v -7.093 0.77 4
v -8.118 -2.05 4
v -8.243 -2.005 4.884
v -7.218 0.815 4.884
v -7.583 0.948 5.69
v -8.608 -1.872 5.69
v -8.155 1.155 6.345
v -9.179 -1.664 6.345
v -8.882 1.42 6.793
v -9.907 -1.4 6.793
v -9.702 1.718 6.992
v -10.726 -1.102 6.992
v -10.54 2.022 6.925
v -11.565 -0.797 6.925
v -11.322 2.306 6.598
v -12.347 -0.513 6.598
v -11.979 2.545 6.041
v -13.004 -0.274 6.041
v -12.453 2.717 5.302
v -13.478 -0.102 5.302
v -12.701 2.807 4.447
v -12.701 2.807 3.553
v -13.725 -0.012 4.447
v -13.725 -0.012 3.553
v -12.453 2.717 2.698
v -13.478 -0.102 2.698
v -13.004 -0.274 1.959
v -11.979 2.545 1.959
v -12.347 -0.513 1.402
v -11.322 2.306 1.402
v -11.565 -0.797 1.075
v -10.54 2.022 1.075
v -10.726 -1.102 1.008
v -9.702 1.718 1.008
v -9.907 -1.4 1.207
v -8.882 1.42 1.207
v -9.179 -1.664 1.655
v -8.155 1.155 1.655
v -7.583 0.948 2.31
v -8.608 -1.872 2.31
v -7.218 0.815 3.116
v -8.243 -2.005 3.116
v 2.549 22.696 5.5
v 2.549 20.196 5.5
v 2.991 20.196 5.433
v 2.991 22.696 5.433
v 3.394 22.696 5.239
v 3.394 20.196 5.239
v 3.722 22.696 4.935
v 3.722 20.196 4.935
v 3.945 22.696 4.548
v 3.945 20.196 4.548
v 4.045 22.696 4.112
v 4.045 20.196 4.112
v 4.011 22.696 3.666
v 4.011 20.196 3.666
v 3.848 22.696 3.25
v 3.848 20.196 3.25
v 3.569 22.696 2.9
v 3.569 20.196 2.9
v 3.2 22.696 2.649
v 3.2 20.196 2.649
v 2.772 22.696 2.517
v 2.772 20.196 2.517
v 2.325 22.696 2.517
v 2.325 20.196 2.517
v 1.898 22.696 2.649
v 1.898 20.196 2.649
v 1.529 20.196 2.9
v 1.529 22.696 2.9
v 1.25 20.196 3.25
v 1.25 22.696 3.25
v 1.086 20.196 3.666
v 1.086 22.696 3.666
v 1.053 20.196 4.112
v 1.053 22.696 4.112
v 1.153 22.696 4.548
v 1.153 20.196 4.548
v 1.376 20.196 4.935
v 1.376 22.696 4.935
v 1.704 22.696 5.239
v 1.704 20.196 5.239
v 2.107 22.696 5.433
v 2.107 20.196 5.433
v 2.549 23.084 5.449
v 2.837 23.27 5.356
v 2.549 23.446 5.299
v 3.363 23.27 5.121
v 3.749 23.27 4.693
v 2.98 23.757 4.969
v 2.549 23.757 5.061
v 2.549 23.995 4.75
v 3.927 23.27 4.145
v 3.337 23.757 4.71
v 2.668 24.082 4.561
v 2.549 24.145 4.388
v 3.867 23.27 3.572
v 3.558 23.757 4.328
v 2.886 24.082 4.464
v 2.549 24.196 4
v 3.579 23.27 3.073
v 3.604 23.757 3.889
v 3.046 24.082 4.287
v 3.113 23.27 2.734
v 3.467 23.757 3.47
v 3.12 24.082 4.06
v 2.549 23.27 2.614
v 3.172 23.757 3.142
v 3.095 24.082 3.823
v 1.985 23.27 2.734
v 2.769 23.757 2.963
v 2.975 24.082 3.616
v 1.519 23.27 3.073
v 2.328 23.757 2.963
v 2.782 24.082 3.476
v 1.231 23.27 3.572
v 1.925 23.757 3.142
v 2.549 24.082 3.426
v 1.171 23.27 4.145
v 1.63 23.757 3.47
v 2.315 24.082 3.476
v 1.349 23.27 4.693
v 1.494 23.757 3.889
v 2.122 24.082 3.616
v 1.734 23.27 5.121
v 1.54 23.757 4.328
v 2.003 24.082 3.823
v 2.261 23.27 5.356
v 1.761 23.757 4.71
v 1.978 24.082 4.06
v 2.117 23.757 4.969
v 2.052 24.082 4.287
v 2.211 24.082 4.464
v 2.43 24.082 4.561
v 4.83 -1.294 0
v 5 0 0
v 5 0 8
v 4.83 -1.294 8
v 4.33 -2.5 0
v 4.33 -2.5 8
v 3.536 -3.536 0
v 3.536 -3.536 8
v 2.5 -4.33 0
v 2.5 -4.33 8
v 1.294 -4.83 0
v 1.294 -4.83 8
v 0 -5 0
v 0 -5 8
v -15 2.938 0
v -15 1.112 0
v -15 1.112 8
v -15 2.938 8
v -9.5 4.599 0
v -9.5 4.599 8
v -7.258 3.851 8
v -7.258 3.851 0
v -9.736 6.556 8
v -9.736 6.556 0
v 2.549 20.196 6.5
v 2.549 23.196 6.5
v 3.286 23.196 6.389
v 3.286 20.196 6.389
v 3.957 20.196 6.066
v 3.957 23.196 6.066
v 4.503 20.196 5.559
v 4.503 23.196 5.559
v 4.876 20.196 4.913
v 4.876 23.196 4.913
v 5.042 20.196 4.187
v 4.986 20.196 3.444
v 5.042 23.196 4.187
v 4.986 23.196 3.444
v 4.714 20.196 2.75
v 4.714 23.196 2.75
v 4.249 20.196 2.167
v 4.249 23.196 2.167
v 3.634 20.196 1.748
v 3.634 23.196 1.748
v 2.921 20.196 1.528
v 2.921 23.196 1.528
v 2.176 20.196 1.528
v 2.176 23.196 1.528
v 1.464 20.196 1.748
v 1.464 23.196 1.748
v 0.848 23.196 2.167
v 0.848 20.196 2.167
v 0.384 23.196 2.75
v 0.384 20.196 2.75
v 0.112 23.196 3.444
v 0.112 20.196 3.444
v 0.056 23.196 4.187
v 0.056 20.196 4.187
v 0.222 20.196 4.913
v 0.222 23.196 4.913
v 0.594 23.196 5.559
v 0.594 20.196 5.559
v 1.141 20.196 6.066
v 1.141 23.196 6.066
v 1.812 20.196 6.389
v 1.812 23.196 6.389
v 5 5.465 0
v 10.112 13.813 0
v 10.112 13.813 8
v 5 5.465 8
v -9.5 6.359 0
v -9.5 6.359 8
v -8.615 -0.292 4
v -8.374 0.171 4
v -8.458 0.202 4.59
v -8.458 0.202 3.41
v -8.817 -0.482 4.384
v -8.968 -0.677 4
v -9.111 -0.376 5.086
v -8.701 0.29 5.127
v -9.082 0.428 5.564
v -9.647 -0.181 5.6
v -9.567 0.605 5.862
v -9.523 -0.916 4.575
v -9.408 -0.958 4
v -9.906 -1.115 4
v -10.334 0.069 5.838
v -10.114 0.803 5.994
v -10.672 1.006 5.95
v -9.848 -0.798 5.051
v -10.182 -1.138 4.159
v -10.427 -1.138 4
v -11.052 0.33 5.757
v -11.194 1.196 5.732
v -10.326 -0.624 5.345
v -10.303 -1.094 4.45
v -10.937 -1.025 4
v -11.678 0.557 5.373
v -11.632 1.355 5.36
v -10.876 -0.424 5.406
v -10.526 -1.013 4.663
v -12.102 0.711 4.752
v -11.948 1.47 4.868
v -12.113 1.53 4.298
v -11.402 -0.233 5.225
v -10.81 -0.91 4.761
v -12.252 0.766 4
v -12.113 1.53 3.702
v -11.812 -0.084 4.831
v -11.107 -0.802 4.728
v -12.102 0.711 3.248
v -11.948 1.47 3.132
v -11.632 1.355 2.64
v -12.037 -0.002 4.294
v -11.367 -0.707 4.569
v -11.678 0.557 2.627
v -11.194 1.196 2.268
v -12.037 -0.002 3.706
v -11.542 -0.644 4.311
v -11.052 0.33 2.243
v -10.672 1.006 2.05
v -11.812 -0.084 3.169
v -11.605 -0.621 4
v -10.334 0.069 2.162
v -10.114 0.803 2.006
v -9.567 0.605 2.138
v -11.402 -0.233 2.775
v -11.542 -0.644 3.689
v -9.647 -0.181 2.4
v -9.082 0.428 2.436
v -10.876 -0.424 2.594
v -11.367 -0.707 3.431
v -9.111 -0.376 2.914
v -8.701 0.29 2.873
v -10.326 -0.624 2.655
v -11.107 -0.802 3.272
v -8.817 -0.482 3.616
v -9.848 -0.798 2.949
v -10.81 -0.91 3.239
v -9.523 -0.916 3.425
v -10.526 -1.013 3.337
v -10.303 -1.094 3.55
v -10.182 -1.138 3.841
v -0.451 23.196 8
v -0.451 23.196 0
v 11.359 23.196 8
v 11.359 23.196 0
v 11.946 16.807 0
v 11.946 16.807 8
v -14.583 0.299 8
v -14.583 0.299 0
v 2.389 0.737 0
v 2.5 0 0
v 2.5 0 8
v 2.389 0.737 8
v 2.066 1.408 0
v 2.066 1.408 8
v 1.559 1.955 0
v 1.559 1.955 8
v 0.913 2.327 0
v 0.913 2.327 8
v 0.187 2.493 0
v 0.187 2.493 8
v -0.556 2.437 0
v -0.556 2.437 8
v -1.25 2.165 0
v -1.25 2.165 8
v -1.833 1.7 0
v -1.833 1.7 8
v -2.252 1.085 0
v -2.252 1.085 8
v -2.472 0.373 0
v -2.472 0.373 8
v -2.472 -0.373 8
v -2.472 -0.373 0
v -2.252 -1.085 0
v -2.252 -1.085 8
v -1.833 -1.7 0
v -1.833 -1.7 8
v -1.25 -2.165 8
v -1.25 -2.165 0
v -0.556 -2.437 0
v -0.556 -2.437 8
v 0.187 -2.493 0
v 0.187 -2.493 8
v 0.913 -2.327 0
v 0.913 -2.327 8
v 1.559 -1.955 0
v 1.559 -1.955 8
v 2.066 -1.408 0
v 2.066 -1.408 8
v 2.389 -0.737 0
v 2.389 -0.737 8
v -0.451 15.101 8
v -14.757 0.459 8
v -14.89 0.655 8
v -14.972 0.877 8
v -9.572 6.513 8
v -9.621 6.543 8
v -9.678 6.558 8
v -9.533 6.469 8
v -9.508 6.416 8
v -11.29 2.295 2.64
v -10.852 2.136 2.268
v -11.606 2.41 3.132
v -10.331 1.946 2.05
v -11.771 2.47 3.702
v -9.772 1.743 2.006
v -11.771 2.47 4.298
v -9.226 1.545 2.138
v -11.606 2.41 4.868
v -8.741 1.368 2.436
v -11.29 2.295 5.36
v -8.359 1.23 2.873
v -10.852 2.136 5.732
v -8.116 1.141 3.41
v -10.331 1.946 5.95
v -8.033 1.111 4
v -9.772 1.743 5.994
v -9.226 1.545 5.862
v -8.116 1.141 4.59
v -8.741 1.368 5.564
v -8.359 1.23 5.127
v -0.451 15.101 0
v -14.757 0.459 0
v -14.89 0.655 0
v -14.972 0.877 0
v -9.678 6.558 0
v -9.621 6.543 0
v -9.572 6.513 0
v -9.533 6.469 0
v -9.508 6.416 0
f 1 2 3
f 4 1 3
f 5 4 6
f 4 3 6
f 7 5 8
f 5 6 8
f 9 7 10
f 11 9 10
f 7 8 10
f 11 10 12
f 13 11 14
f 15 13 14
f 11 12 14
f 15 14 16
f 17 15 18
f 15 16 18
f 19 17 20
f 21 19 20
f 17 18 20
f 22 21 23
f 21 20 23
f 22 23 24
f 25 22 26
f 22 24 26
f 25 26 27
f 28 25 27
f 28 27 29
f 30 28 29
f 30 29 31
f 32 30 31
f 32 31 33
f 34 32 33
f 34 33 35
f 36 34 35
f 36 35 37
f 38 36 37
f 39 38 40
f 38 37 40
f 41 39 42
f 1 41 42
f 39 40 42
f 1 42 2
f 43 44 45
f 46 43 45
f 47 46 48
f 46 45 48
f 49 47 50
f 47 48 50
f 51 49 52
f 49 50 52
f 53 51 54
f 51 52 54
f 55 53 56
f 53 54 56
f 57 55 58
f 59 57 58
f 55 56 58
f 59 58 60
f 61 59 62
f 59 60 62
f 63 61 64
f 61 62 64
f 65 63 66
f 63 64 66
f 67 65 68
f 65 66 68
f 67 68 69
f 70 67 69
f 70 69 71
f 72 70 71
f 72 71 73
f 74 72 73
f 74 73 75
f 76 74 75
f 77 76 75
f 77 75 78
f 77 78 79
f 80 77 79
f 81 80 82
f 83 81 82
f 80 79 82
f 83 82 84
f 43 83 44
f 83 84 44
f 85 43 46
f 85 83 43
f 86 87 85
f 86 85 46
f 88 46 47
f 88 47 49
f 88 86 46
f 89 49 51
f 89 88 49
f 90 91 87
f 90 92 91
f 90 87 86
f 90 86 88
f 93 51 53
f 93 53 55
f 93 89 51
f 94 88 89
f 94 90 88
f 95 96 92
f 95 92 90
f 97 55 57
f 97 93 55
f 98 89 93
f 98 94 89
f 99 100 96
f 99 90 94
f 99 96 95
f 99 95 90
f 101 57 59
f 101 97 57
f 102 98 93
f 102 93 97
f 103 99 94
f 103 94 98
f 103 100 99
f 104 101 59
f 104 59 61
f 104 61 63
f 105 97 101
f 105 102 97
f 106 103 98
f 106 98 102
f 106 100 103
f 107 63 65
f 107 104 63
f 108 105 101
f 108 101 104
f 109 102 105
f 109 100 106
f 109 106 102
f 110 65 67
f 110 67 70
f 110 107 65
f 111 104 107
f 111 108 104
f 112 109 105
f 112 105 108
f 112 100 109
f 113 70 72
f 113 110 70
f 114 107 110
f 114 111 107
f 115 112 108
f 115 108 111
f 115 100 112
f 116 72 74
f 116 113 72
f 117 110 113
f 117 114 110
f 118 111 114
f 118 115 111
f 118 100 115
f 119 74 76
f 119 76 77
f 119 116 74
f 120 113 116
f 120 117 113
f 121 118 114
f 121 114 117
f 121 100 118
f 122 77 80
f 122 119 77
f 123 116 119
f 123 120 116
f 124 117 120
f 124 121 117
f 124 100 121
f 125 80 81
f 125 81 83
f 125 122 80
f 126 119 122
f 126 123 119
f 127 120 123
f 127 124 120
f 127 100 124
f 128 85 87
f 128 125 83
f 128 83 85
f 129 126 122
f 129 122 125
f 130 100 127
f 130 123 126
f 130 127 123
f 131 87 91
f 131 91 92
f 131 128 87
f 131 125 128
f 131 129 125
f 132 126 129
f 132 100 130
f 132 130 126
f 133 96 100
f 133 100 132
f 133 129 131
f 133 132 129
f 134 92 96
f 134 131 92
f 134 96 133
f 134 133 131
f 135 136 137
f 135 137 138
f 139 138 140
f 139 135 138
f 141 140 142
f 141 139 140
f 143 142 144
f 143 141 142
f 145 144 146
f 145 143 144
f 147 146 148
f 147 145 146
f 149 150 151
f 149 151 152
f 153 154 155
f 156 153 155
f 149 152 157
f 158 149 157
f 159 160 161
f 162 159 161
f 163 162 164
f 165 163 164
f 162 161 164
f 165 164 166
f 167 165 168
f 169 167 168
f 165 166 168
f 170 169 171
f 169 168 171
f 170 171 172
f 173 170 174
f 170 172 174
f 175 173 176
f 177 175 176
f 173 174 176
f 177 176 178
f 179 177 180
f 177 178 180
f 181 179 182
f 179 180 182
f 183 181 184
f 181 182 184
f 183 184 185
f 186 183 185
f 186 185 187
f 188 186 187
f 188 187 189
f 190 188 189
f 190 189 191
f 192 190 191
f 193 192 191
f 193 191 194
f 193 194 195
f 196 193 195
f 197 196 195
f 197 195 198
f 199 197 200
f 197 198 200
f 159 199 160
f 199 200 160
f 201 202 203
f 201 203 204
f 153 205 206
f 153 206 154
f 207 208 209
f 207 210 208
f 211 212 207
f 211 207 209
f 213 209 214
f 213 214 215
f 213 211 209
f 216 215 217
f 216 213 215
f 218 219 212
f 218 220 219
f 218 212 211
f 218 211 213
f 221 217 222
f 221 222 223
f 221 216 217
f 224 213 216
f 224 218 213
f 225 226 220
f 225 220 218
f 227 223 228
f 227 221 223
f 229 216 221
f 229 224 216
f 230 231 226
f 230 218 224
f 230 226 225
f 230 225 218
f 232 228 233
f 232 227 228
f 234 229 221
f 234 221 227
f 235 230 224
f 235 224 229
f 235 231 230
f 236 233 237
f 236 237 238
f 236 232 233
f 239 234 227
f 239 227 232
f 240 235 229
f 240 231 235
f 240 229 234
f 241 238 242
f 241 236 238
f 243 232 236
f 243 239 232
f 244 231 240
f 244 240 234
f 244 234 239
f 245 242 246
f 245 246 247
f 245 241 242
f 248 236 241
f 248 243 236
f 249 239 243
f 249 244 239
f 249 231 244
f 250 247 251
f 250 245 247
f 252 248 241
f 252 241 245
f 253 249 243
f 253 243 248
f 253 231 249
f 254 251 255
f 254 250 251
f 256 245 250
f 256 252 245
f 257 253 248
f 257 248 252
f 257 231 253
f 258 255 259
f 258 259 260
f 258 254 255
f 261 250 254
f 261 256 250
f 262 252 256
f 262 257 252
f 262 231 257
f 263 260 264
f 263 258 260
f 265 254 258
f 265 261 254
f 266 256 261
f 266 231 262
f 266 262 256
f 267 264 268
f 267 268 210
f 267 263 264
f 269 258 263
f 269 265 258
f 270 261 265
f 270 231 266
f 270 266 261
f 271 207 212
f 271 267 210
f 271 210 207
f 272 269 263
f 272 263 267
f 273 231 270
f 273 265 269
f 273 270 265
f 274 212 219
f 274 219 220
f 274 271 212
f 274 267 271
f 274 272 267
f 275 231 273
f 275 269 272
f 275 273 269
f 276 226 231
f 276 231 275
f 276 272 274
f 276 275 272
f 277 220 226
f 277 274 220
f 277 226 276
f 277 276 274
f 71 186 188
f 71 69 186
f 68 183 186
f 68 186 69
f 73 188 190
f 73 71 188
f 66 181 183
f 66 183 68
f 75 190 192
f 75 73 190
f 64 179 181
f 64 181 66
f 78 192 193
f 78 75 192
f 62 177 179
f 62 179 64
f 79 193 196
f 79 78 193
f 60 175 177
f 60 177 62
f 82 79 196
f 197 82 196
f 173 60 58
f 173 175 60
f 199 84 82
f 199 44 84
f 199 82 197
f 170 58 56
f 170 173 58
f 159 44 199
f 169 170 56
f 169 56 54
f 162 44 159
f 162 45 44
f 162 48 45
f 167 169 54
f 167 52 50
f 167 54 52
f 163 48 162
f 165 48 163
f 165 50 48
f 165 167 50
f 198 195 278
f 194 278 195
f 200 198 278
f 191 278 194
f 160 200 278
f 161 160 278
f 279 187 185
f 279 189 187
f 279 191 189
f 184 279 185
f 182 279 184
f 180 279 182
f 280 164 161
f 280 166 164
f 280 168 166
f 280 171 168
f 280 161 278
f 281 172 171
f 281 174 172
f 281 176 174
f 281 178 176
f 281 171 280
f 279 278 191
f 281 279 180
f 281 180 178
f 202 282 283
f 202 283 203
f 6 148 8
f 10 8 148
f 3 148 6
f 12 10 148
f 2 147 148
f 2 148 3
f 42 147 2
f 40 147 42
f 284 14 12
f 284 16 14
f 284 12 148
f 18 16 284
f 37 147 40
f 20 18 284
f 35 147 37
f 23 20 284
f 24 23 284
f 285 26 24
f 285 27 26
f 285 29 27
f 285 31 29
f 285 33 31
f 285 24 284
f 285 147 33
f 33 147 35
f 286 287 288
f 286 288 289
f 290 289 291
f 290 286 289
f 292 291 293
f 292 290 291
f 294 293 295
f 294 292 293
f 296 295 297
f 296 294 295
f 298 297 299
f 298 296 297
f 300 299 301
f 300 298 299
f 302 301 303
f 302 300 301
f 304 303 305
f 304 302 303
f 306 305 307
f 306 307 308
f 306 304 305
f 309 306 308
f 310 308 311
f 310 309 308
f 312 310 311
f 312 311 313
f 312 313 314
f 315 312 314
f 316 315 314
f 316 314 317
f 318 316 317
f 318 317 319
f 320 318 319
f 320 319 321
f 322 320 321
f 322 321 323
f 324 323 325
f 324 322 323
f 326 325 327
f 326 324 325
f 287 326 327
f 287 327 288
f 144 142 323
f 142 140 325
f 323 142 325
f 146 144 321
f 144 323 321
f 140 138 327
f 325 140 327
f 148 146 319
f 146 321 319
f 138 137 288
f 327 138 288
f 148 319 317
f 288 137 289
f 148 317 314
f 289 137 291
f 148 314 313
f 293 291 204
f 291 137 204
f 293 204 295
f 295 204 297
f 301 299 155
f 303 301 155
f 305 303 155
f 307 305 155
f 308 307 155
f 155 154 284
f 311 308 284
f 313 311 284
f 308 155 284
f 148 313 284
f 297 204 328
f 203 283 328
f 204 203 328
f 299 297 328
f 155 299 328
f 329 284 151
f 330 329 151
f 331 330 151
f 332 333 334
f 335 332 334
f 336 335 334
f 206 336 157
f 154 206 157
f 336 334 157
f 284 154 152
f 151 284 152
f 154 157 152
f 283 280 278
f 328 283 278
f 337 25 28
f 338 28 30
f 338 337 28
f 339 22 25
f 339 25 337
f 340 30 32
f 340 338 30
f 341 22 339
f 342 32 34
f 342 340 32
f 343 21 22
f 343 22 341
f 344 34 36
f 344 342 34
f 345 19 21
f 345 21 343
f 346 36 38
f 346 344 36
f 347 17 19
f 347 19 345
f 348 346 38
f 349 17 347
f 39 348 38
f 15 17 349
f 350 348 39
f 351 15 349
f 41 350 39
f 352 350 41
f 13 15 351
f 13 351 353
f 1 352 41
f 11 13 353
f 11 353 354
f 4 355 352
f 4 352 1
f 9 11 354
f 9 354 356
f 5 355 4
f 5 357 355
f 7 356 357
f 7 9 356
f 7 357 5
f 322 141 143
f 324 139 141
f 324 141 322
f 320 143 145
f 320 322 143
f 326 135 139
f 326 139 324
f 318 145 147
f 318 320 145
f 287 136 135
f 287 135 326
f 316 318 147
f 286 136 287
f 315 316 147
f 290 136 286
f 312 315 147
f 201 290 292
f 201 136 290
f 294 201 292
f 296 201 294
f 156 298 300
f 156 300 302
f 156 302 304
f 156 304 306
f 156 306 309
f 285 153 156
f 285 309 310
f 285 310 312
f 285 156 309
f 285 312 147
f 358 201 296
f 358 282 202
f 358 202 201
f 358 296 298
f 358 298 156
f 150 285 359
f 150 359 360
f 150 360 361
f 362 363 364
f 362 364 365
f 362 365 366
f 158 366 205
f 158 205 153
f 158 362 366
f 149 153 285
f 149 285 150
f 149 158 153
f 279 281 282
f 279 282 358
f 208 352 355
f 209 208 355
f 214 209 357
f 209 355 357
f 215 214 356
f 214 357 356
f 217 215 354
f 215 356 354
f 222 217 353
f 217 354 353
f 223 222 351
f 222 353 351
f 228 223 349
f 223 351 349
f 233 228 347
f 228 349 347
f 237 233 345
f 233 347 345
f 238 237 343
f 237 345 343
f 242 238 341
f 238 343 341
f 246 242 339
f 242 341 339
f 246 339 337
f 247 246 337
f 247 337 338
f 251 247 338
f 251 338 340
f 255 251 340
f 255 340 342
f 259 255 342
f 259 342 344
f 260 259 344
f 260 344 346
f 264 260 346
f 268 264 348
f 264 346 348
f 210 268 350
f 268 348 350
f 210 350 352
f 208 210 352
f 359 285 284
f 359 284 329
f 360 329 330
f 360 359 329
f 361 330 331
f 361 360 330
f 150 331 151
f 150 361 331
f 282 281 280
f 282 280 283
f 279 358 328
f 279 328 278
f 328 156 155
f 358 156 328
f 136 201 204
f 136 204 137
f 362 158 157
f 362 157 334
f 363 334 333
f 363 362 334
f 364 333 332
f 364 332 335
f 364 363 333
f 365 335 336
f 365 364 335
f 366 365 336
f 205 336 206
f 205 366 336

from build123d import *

# Parameters (mm, degrees)
SKETCH_1_R          = 2.5
EXTRUDE_1_DEPTH     = 8
SKETCH_5_R          = 3
CUT_EXTRUDE_2_DEPTH = 3
SKETCH_7_R          = 2
EXTRUDE_3_DEPTH     = 3
FILLET_5_R          = 2
SKETCH_8_R          = 2.5
CUT_EXTRUDE_3_DEPTH = 3
SKETCH_9_R          = 1.5
EXTRUDE_4_DEPTH     = 4
FILLET_6_R          = 1.5


with BuildPart() as part:
    # 스케치1 → 보스-돌출1 (new body)
    with BuildSketch(Plane.XY):
        with BuildLine():
            Line((-0.451148657, 21.875531488), (-0.451148657, 23.195899803))
            Line((-0.451148657, 23.195899803), (11.359015021, 23.195899803))
            Line((11.359015021, 23.195899803), (11.945796901, 16.807444187))
            Line((11.945796901, 16.807444187), (10.112329073, 13.81338505))
            Line((10.112329073, 13.81338505), (5, 5.464934457))
            Line((5, 5.464934457), (5, 3.83484861))
            Line((5, 3.83484861), (5, 0))
            ThreePointArc((5, 0), (3.535533906, -3.535533906), (0, -5))
            Line((0, -5), (-14.582903299, 0.299385373))
            ThreePointArc((-14.582903299, 0.299385373), (-14.889635684, 0.655255963), (-15, 1.111926907))
            Line((-15, 1.111926907), (-15, 2.937976957))
            Line((-15, 2.937976957), (-9.735777088, 6.555734799))
            ThreePointArc((-9.735777088, 6.555734799), (-9.571850512, 6.512511163), (-9.5, 6.358960817))
            Line((-9.5, 6.358960817), (-9.5, 4.598603361))
            Line((-9.5, 4.598603361), (-7.258120431, 3.851310171))
            Line((-7.258120431, 3.851310171), (-0.451148657, 15.101495802))
            Line((-0.451148657, 15.101495802), (-0.451148657, 21.875531488))
        make_face()
        Circle(SKETCH_1_R, mode=Mode.SUBTRACT)
    extrude(amount=EXTRUDE_1_DEPTH)

    # 스케치5 → 컷-돌출2 (cut)
    with BuildSketch(Plane(origin=(-1.605029546, -4.416736851, 0), x_dir=(0.9398656128397294, -0.34154447704713375, 0), z_dir=(-0.34154447704713375, -0.9398656128397295, 0))):
        with Locations((-9.929236479, 4)):
            Circle(SKETCH_5_R)
    extrude(amount=-CUT_EXTRUDE_2_DEPTH, mode=Mode.SUBTRACT)

    # 스케치7 → 보스-돌출3 (add)
    with BuildSketch(Plane(origin=(-0.580396115, -1.597140012, 0), x_dir=(0.9398656128397294, -0.34154447704713387, 0), z_dir=(-0.34154447704713387, -0.9398656128397294, 0))):
        with Locations((-9.929236479, 4)):
            Circle(SKETCH_7_R)
    extrude(amount=EXTRUDE_3_DEPTH)

    # 필렛5
    fillet_5_edges = [part.edges().sort_by_distance(p)[0] for p in [
        (-12.8169087, -0.342372016, 4),
    ]]
    fillet(fillet_5_edges, radius=FILLET_5_R)

    # 스케치8 → 컷-돌출3 (cut)
    with BuildSketch(Plane(origin=(0, 23.195899803, 0), x_dir=(1, 0, 0), z_dir=(0, 1, 0))):
        with Locations(Location((2.548851343, -4, 0), (0, 0, 270))):
            Circle(SKETCH_8_R)
    extrude(amount=-CUT_EXTRUDE_3_DEPTH, mode=Mode.SUBTRACT)

    # 스케치9 → 보스-돌출4 (add)
    with BuildSketch(Plane(origin=(0, 20.195899803, 0), x_dir=(1, 0, 0), z_dir=(0, 1, 0))):
        with Locations(Location((2.548851343, -4, 0), (0, 0, 270))):
            Circle(SKETCH_9_R)
    extrude(amount=EXTRUDE_4_DEPTH)

    # 필렛6
    fillet_6_edges = [part.edges().sort_by_distance(p)[0] for p in [
        (2.548851343, 24.195899803, 2.5),
    ]]
    fillet(fillet_6_edges, radius=FILLET_6_R)


solid = part.part
